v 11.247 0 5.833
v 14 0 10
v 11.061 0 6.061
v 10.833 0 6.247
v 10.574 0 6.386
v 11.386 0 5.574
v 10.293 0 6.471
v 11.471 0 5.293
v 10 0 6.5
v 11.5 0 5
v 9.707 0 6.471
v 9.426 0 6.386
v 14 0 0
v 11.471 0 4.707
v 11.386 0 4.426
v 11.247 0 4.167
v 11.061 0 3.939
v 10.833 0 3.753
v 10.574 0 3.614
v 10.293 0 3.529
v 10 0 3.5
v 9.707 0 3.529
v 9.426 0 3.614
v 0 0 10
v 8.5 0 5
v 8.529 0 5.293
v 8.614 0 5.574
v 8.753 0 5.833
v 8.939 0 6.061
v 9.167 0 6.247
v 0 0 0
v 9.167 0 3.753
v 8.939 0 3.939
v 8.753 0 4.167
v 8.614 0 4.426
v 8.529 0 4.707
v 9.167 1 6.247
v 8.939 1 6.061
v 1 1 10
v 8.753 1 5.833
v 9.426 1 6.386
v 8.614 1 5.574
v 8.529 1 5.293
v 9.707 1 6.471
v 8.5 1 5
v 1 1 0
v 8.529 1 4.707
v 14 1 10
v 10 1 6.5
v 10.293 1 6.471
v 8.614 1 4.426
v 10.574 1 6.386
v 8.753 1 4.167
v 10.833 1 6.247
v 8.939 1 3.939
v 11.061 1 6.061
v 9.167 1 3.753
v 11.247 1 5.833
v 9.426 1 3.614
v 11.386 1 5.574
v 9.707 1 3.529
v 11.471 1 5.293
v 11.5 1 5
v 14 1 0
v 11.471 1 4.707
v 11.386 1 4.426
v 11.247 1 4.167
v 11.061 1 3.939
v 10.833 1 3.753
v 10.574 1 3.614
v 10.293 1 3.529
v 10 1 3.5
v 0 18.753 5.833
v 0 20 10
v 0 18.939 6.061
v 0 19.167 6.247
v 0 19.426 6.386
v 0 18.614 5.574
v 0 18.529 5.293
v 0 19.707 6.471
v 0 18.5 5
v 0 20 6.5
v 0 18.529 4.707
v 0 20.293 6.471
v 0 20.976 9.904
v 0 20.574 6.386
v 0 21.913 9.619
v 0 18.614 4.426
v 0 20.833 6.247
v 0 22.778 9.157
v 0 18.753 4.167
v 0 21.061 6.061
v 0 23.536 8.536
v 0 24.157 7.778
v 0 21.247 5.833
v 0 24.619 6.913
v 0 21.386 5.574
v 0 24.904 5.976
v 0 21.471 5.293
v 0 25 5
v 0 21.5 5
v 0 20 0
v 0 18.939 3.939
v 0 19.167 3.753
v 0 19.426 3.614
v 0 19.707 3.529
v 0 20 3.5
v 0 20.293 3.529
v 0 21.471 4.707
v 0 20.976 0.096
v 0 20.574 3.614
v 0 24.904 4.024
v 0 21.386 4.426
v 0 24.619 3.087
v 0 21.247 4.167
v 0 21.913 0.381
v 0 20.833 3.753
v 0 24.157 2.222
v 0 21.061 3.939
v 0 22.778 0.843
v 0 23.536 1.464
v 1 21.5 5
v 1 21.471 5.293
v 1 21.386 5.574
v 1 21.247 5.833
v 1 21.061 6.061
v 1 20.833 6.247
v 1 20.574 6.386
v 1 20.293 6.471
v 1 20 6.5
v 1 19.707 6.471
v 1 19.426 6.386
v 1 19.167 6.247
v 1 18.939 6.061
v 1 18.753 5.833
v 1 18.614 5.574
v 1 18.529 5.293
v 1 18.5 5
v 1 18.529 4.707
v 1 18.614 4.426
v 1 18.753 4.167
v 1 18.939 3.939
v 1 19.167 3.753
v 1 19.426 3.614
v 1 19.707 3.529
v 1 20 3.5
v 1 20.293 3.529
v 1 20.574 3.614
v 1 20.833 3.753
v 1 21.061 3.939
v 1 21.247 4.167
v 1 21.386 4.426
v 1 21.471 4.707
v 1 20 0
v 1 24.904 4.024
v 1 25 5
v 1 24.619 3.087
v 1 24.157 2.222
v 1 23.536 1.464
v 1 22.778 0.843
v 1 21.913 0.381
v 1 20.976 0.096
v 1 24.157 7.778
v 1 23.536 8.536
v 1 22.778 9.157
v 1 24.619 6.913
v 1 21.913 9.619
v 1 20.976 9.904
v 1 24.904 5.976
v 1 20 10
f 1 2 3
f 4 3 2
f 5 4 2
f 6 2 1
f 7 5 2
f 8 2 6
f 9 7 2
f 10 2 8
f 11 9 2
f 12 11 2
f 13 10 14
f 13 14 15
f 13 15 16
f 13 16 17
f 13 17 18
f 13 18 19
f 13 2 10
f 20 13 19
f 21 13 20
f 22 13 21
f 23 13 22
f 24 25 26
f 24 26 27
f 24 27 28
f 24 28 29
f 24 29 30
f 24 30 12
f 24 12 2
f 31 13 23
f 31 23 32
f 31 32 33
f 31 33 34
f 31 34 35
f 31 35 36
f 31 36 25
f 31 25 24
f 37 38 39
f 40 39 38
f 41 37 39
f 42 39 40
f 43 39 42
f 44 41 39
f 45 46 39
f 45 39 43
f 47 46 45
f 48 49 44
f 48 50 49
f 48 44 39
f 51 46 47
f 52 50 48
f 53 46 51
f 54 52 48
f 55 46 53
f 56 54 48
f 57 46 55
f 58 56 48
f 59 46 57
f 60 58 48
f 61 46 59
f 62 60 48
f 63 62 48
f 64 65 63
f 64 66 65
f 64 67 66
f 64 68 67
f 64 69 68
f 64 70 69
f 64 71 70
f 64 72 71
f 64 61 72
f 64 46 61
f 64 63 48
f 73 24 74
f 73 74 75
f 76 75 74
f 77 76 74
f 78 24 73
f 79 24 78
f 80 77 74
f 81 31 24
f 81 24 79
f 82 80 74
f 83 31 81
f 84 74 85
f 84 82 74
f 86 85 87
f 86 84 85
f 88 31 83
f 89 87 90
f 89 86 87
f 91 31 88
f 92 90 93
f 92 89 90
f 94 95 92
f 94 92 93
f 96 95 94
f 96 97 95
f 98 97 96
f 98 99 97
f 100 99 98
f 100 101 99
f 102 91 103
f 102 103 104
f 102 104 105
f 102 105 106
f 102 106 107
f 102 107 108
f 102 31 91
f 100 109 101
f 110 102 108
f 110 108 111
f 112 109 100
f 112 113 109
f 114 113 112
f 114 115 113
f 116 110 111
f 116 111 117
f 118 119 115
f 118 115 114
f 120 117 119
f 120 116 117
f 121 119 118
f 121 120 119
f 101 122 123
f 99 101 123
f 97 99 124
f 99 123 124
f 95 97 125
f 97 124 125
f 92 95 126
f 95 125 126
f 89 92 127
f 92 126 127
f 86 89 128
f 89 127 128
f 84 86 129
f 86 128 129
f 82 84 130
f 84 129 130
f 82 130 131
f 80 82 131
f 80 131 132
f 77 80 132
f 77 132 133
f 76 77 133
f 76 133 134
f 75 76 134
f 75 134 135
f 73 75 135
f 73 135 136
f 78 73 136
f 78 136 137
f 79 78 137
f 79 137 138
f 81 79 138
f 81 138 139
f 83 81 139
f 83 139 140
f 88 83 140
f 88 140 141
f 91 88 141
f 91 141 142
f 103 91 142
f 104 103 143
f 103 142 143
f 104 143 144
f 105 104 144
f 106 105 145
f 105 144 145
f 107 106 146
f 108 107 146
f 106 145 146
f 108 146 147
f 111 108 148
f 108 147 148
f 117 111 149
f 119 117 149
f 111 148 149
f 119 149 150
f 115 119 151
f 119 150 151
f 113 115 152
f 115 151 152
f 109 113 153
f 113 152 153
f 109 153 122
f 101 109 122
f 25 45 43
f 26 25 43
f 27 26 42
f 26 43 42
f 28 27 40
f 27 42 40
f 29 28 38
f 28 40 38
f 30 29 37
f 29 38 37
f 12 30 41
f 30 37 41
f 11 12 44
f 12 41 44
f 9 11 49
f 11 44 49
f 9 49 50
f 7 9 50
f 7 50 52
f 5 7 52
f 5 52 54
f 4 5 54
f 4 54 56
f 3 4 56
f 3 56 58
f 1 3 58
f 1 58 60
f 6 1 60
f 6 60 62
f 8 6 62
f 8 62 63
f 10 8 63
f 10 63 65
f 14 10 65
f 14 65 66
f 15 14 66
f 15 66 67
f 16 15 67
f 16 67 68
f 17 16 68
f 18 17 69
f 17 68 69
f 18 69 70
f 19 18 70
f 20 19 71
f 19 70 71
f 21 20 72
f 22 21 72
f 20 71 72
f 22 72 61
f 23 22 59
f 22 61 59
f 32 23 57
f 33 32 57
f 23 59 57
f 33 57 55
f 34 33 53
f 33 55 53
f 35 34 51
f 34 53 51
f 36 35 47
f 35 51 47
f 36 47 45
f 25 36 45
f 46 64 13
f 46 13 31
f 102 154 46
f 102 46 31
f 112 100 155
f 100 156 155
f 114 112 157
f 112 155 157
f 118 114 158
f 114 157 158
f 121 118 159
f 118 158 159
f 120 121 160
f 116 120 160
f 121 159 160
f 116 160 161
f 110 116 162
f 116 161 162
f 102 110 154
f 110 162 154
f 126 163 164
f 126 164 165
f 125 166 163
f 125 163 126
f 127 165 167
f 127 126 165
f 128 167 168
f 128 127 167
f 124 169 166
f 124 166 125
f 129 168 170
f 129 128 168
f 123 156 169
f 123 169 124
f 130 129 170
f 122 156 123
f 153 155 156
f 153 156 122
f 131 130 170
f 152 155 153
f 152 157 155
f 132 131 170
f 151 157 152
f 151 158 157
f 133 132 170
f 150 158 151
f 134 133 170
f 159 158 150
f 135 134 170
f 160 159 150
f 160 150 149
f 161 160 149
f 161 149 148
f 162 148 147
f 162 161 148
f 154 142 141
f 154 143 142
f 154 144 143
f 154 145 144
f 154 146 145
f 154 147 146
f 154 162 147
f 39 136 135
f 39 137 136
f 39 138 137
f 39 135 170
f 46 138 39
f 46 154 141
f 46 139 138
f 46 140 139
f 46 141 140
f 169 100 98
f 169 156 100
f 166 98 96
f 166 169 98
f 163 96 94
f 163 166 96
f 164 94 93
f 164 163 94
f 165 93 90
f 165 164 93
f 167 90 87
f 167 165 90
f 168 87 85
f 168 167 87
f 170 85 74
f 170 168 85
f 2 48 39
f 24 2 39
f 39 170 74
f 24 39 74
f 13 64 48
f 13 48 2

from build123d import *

# Parameters (mm, degrees)
BOSS_EXTRUDE1_DEPTH = 10
FILLET1_R           = 5
SKETCH2_R           = 1.5
CUT_EXTRUDE1_DEPTH  = 30.899832775
SKETCH3_R           = 1.5
CUT_EXTRUDE2_DEPTH  = 30.52964612


with BuildPart() as part:
    # Sketch1 → Boss-Extrude1 (new body)
    with BuildSketch(Plane.XY):
        Polygon((0, 0), (0, 25), (1, 25), (1, 1), (14, 1), (14, 0), align=None)
    extrude(amount=BOSS_EXTRUDE1_DEPTH)

    # Fillet1
    fillet1_edges = [part.edges().sort_by_distance(p)[0] for p in [
        (0.5, 25, 0),
        (0.5, 25, 10),
    ]]
    fillet(fillet1_edges, radius=FILLET1_R - 0.0001)  # a hair under: the kernel refuses the full size

    # Sketch2 → Cut-Extrude1 (cut, through all)
    with BuildSketch(Plane(origin=(1, 0, 0), x_dir=(0, 0, -1), z_dir=(1, 0, 0))):
        with Locations(Location((-5, 20, 0), (0, 0, 90))):
            Circle(SKETCH2_R)
    extrude(amount=-CUT_EXTRUDE1_DEPTH, mode=Mode.SUBTRACT)

    # Sketch3 → Cut-Extrude2 (cut, through all)
    with BuildSketch(Plane(origin=(0, 1, 0), x_dir=(1, 0, 0), z_dir=(0, 1, 0))):
        with Locations(Location((10, -5, 0), (0, 0, 180))):
            Circle(SKETCH3_R)
    extrude(amount=-CUT_EXTRUDE2_DEPTH, mode=Mode.SUBTRACT)


solid = part.part
